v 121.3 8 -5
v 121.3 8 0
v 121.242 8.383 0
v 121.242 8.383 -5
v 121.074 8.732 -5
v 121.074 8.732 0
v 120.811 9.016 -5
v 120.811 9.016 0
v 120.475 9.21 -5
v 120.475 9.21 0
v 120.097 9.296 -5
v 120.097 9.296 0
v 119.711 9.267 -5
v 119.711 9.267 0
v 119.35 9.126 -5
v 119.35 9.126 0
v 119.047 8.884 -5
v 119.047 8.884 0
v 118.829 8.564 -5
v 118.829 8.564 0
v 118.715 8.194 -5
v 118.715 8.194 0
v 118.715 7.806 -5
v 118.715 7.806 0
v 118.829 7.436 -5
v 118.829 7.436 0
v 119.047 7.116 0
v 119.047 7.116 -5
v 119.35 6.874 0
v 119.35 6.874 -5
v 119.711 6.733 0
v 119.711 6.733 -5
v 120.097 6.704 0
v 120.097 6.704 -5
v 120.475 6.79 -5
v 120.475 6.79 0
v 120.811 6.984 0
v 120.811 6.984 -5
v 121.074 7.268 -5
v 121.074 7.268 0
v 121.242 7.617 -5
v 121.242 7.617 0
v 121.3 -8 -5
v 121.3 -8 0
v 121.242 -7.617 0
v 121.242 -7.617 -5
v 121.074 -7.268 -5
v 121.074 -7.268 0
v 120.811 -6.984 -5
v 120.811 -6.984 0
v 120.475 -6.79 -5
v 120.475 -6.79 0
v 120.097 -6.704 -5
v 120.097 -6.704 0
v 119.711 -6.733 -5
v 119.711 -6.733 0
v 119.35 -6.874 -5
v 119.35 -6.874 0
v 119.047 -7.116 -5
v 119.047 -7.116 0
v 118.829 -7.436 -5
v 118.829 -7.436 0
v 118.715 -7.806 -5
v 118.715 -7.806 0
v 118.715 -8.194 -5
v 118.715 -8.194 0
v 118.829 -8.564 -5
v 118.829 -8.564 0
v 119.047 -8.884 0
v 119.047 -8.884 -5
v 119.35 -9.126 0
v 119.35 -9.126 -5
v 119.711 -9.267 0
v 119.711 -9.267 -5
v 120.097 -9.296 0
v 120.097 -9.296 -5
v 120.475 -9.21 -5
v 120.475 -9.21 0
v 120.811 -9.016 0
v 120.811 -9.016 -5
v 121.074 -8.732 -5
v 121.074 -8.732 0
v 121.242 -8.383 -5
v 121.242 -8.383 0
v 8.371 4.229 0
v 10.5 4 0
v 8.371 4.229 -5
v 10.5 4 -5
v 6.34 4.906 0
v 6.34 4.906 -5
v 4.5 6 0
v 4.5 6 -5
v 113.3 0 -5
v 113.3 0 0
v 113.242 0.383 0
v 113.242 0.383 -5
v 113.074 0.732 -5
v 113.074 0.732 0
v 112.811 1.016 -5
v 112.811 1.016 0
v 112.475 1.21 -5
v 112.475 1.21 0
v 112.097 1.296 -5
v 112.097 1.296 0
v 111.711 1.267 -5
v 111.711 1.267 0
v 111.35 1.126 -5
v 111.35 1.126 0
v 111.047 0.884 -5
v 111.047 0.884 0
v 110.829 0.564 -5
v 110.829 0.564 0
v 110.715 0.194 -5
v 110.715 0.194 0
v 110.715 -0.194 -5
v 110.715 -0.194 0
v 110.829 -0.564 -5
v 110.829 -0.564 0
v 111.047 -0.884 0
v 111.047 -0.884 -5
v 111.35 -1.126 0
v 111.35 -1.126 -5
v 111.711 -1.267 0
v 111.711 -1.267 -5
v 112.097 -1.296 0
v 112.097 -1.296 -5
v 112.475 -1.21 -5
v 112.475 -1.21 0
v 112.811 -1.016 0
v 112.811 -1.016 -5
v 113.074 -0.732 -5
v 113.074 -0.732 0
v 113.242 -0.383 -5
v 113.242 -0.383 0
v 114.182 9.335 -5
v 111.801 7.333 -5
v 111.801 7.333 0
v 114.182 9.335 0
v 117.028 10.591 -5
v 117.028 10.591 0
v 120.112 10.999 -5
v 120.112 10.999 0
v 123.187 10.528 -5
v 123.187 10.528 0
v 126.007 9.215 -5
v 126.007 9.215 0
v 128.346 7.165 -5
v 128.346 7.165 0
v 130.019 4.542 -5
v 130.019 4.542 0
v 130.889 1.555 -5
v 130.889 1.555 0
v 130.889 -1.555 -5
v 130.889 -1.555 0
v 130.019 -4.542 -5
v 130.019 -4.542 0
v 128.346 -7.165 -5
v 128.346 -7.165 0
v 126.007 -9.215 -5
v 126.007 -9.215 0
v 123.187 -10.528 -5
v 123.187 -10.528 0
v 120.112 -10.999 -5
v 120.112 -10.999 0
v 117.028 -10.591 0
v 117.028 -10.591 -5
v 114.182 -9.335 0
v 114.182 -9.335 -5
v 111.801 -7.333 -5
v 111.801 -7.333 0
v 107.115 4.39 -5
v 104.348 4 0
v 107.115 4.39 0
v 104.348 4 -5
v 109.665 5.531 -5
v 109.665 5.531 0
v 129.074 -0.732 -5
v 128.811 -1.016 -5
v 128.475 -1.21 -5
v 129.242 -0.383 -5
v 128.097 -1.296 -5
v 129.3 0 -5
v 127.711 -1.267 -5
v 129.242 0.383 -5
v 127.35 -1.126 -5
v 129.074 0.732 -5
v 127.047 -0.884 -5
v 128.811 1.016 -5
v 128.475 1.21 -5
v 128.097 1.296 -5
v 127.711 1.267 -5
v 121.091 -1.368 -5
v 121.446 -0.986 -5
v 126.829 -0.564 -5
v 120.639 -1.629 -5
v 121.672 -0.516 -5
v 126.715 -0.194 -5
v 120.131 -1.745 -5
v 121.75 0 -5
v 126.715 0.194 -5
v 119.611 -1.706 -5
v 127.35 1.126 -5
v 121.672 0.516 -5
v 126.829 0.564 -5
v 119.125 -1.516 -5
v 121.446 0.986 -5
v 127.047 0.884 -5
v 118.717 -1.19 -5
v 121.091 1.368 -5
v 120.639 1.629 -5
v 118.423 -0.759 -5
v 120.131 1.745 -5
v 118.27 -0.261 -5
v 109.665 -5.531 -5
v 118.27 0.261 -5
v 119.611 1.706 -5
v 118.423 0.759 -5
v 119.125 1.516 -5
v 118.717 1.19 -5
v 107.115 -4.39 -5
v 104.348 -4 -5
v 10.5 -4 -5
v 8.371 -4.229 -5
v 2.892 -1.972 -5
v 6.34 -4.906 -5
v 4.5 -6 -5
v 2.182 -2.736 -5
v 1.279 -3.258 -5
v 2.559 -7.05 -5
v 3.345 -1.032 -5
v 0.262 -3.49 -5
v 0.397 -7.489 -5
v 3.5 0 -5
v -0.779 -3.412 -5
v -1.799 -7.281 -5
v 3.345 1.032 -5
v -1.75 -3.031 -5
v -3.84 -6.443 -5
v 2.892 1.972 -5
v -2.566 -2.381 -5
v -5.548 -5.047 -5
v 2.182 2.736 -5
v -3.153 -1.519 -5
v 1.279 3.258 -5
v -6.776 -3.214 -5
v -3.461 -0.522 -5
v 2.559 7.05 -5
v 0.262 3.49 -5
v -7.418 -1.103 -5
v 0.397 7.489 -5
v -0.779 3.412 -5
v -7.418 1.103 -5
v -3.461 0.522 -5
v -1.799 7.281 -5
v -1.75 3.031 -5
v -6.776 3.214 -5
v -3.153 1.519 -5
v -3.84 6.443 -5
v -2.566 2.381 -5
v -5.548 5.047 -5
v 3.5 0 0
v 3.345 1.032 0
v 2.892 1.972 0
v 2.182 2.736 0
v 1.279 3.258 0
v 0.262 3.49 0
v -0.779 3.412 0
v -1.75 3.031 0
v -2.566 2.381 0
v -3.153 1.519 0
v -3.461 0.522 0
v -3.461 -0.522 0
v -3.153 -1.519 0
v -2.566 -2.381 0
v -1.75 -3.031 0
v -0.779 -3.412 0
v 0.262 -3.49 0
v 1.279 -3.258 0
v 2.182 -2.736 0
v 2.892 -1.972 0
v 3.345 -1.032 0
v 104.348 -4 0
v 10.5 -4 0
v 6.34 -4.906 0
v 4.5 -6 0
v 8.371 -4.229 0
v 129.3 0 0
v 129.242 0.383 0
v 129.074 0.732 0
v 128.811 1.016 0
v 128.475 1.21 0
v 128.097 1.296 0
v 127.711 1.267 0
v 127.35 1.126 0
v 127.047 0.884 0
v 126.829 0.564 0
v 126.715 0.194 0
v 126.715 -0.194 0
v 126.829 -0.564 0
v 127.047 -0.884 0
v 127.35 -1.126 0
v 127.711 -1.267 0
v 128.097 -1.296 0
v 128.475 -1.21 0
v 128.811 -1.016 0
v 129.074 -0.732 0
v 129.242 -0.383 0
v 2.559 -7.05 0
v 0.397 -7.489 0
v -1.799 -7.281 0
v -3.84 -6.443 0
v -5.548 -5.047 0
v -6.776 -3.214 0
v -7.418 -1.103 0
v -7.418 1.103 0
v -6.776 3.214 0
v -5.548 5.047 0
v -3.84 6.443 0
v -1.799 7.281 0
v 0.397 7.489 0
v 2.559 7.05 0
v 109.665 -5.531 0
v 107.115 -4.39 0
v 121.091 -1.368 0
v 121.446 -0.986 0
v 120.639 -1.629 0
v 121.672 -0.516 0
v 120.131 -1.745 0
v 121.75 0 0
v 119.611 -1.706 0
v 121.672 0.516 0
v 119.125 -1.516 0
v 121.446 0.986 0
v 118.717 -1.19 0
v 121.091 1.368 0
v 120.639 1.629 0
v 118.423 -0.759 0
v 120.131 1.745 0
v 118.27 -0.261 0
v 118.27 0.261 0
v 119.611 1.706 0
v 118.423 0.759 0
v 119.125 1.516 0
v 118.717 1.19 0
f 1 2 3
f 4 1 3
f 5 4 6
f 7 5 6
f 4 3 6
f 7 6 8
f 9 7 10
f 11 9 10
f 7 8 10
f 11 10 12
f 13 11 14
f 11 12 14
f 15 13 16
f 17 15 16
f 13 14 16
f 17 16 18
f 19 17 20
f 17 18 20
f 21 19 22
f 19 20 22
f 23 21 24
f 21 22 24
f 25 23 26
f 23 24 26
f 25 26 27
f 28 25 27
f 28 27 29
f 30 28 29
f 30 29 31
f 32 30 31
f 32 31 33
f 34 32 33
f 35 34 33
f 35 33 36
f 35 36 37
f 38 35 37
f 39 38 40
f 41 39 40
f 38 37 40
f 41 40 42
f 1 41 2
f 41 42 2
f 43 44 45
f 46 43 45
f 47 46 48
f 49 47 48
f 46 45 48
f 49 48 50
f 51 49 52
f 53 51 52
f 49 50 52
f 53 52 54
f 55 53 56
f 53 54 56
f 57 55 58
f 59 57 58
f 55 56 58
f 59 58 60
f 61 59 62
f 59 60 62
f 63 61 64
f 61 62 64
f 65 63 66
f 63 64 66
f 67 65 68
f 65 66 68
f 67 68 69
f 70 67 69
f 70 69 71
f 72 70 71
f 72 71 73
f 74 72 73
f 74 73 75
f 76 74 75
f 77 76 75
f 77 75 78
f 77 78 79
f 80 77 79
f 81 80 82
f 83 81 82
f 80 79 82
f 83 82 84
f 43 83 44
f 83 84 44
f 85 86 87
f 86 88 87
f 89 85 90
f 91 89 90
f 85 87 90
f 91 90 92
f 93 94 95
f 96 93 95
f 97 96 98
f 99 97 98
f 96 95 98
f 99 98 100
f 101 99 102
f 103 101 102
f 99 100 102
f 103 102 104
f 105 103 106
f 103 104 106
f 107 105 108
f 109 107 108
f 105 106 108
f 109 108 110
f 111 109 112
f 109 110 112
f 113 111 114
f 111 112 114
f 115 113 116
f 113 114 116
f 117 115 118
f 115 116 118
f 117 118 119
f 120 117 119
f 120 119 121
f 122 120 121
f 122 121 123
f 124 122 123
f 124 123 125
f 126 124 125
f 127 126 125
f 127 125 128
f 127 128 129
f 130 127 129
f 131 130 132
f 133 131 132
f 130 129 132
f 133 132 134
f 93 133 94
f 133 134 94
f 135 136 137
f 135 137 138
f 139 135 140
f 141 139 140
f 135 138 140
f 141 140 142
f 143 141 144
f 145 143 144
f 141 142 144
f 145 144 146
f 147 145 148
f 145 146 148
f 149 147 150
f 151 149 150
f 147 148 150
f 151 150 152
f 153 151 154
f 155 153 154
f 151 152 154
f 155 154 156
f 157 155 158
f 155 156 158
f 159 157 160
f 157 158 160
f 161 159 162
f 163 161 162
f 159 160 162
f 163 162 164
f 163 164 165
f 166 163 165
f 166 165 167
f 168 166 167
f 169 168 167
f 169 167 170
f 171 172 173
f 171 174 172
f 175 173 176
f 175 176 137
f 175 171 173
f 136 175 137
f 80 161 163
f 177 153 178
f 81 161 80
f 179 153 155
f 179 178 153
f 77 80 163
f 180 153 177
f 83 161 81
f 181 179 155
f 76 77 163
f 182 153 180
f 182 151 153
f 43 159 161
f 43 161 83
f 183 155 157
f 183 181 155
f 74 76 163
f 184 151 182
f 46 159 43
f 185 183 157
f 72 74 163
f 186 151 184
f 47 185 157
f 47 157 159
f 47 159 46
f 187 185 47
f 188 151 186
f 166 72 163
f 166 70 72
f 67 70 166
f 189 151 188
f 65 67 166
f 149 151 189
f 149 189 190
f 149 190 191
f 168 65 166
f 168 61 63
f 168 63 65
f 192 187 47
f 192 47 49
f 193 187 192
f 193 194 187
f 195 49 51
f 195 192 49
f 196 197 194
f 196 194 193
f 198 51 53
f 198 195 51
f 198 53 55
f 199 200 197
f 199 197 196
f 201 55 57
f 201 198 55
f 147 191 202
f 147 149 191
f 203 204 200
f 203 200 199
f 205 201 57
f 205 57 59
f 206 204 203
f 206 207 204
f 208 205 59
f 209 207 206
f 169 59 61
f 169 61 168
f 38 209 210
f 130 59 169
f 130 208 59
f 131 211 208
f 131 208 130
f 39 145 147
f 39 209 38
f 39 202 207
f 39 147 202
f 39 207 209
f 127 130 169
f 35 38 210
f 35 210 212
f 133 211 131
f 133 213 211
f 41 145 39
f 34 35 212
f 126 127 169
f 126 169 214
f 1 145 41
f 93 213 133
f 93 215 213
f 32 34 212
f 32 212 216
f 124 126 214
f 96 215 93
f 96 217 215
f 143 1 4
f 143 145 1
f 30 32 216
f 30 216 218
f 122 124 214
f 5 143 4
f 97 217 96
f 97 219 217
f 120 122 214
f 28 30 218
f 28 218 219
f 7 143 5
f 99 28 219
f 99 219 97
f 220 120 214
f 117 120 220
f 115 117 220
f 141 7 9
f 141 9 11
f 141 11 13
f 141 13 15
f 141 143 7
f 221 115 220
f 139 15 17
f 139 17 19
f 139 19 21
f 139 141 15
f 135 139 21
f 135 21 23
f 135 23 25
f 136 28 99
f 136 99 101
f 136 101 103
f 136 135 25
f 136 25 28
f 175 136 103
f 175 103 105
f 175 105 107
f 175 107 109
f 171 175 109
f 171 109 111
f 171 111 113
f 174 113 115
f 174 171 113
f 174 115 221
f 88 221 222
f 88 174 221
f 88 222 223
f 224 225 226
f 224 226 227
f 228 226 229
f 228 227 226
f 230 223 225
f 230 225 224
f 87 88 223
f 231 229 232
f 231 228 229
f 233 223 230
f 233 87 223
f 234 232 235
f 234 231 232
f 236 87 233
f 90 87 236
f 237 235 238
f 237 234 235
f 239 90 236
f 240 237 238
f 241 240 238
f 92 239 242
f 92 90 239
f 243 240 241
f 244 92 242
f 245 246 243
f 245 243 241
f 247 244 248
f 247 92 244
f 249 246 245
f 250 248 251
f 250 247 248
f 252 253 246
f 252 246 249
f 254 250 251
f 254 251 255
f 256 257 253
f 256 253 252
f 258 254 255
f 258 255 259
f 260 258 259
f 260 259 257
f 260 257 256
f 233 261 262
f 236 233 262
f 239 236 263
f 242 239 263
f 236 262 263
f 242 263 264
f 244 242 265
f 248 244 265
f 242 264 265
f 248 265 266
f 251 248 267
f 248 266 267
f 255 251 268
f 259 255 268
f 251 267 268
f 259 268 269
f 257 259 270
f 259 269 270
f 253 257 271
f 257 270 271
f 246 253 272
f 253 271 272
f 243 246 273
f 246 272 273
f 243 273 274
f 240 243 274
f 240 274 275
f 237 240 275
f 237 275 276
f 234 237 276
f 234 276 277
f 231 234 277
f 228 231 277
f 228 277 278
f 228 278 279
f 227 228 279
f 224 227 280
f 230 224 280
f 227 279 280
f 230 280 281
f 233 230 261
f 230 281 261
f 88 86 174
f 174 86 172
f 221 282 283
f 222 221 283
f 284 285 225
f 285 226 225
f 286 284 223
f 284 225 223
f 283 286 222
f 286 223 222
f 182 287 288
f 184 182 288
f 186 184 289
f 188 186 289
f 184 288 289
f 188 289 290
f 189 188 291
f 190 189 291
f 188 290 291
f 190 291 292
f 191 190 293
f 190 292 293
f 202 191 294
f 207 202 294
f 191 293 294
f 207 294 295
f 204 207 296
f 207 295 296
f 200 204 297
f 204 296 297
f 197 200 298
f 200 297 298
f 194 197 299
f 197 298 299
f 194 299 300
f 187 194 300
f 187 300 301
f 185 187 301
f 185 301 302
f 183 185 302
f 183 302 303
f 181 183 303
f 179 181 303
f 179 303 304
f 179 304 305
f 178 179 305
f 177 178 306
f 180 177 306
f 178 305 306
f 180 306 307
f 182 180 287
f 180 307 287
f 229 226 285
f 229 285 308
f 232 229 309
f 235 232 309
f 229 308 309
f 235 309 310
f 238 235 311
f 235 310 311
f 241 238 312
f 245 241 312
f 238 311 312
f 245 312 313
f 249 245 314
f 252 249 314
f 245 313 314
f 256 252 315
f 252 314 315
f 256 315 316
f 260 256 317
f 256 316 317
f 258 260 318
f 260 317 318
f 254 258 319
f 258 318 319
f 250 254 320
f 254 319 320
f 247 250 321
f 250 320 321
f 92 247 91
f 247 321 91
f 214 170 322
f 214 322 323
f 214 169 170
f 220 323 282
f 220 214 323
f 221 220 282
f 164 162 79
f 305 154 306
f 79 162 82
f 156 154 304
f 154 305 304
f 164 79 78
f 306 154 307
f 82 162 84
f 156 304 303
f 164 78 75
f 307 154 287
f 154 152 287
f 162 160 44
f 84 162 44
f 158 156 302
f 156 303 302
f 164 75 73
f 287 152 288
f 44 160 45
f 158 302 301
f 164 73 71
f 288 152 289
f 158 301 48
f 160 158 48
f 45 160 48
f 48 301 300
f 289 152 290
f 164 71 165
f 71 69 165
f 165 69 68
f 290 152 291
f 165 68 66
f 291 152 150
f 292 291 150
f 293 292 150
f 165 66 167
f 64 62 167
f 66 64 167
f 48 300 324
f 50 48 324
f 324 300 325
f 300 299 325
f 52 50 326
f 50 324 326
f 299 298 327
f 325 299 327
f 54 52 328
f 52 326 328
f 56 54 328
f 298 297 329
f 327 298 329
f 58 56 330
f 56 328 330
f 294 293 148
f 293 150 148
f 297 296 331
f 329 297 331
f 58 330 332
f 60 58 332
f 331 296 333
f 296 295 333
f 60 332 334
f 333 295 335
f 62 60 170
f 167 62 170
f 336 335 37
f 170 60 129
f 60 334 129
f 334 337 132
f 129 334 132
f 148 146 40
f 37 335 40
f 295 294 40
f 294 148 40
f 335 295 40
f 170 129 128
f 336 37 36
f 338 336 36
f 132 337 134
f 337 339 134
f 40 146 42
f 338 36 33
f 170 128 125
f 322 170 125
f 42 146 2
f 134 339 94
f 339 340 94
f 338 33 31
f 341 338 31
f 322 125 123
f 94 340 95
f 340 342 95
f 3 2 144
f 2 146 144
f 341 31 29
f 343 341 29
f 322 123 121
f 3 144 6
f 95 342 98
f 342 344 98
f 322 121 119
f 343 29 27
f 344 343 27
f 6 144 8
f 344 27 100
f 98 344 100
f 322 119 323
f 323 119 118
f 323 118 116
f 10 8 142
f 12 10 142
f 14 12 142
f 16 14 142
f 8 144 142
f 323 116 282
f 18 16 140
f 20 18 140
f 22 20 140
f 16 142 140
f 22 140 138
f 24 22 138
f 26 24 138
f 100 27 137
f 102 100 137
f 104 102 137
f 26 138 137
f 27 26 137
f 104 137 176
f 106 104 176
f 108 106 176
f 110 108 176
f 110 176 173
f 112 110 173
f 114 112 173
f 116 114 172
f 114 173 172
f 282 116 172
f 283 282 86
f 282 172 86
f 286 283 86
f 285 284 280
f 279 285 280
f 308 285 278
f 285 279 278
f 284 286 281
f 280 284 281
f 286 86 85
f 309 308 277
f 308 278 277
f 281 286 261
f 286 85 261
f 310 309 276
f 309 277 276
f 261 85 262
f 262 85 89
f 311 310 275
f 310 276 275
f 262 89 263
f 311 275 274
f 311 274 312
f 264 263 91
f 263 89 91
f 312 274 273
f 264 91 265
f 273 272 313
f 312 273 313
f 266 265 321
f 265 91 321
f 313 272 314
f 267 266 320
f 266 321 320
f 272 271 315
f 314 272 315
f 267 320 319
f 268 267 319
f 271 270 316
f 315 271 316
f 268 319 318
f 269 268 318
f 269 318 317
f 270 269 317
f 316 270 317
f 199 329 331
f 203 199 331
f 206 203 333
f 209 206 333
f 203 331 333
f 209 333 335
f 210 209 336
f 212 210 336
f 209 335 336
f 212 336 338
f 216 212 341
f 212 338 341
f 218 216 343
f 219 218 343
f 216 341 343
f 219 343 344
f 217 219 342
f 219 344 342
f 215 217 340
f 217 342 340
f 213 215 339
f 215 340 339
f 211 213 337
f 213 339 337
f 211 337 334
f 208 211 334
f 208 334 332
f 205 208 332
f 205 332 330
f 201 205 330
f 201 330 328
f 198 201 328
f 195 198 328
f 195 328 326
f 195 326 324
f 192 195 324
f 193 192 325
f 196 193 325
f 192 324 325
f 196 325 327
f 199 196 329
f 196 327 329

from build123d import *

# Parameters (mm, degrees)
SKETCH1_R          = 3.5
SKETCH1_R_2        = 1.3
SKETCH1_R_3        = 1.75
BASE_FLANGE1_DEPTH = 5
FILLET1_R          = 10
FILLET2_R          = 10


# Sheet-metal steps are written as plain solids
with BuildPart() as part:
    # Sketch1 → Base-Flange1 (new body)
    with BuildSketch(Plane.XY):
        with BuildLine():
            Line((6.34428877, 4), (109.753049234, 4))
            ThreePointArc((109.753049234, 4), (131, 0), (109.753049234, -4))
            Line((109.753049234, -4), (6.34428877, -4))
            ThreePointArc((6.34428877, -4), (-7.5, 0), (6.34428877, 4))
        make_face()
        Circle(SKETCH1_R, mode=Mode.SUBTRACT)
        with Locations((112, 0)):
            Circle(SKETCH1_R_2, mode=Mode.SUBTRACT)
        with Locations((120, -8)):
            Circle(SKETCH1_R_2, mode=Mode.SUBTRACT)
        with Locations((128, 0)):
            Circle(SKETCH1_R_2, mode=Mode.SUBTRACT)
        with Locations((120, 8)):
            Circle(SKETCH1_R_2, mode=Mode.SUBTRACT)
        with Locations((120, 0)):
            Circle(SKETCH1_R_3, mode=Mode.SUBTRACT)
    extrude(amount=-BASE_FLANGE1_DEPTH)

    # Fillet1
    fillet1_edges = [part.edges().sort_by_distance(p)[0] for p in [
        (6.34428877, 4, -2.5),
        (6.34428877, -4, -2.5),
    ]]
    fillet(fillet1_edges, radius=FILLET1_R)

    # Fillet2
    fillet2_edges = [part.edges().sort_by_distance(p)[0] for p in [
        (109.753049234, 4, -2.5),
        (109.753049234, -4, -2.5),
    ]]
    fillet(fillet2_edges, radius=FILLET2_R)


solid = part.part
